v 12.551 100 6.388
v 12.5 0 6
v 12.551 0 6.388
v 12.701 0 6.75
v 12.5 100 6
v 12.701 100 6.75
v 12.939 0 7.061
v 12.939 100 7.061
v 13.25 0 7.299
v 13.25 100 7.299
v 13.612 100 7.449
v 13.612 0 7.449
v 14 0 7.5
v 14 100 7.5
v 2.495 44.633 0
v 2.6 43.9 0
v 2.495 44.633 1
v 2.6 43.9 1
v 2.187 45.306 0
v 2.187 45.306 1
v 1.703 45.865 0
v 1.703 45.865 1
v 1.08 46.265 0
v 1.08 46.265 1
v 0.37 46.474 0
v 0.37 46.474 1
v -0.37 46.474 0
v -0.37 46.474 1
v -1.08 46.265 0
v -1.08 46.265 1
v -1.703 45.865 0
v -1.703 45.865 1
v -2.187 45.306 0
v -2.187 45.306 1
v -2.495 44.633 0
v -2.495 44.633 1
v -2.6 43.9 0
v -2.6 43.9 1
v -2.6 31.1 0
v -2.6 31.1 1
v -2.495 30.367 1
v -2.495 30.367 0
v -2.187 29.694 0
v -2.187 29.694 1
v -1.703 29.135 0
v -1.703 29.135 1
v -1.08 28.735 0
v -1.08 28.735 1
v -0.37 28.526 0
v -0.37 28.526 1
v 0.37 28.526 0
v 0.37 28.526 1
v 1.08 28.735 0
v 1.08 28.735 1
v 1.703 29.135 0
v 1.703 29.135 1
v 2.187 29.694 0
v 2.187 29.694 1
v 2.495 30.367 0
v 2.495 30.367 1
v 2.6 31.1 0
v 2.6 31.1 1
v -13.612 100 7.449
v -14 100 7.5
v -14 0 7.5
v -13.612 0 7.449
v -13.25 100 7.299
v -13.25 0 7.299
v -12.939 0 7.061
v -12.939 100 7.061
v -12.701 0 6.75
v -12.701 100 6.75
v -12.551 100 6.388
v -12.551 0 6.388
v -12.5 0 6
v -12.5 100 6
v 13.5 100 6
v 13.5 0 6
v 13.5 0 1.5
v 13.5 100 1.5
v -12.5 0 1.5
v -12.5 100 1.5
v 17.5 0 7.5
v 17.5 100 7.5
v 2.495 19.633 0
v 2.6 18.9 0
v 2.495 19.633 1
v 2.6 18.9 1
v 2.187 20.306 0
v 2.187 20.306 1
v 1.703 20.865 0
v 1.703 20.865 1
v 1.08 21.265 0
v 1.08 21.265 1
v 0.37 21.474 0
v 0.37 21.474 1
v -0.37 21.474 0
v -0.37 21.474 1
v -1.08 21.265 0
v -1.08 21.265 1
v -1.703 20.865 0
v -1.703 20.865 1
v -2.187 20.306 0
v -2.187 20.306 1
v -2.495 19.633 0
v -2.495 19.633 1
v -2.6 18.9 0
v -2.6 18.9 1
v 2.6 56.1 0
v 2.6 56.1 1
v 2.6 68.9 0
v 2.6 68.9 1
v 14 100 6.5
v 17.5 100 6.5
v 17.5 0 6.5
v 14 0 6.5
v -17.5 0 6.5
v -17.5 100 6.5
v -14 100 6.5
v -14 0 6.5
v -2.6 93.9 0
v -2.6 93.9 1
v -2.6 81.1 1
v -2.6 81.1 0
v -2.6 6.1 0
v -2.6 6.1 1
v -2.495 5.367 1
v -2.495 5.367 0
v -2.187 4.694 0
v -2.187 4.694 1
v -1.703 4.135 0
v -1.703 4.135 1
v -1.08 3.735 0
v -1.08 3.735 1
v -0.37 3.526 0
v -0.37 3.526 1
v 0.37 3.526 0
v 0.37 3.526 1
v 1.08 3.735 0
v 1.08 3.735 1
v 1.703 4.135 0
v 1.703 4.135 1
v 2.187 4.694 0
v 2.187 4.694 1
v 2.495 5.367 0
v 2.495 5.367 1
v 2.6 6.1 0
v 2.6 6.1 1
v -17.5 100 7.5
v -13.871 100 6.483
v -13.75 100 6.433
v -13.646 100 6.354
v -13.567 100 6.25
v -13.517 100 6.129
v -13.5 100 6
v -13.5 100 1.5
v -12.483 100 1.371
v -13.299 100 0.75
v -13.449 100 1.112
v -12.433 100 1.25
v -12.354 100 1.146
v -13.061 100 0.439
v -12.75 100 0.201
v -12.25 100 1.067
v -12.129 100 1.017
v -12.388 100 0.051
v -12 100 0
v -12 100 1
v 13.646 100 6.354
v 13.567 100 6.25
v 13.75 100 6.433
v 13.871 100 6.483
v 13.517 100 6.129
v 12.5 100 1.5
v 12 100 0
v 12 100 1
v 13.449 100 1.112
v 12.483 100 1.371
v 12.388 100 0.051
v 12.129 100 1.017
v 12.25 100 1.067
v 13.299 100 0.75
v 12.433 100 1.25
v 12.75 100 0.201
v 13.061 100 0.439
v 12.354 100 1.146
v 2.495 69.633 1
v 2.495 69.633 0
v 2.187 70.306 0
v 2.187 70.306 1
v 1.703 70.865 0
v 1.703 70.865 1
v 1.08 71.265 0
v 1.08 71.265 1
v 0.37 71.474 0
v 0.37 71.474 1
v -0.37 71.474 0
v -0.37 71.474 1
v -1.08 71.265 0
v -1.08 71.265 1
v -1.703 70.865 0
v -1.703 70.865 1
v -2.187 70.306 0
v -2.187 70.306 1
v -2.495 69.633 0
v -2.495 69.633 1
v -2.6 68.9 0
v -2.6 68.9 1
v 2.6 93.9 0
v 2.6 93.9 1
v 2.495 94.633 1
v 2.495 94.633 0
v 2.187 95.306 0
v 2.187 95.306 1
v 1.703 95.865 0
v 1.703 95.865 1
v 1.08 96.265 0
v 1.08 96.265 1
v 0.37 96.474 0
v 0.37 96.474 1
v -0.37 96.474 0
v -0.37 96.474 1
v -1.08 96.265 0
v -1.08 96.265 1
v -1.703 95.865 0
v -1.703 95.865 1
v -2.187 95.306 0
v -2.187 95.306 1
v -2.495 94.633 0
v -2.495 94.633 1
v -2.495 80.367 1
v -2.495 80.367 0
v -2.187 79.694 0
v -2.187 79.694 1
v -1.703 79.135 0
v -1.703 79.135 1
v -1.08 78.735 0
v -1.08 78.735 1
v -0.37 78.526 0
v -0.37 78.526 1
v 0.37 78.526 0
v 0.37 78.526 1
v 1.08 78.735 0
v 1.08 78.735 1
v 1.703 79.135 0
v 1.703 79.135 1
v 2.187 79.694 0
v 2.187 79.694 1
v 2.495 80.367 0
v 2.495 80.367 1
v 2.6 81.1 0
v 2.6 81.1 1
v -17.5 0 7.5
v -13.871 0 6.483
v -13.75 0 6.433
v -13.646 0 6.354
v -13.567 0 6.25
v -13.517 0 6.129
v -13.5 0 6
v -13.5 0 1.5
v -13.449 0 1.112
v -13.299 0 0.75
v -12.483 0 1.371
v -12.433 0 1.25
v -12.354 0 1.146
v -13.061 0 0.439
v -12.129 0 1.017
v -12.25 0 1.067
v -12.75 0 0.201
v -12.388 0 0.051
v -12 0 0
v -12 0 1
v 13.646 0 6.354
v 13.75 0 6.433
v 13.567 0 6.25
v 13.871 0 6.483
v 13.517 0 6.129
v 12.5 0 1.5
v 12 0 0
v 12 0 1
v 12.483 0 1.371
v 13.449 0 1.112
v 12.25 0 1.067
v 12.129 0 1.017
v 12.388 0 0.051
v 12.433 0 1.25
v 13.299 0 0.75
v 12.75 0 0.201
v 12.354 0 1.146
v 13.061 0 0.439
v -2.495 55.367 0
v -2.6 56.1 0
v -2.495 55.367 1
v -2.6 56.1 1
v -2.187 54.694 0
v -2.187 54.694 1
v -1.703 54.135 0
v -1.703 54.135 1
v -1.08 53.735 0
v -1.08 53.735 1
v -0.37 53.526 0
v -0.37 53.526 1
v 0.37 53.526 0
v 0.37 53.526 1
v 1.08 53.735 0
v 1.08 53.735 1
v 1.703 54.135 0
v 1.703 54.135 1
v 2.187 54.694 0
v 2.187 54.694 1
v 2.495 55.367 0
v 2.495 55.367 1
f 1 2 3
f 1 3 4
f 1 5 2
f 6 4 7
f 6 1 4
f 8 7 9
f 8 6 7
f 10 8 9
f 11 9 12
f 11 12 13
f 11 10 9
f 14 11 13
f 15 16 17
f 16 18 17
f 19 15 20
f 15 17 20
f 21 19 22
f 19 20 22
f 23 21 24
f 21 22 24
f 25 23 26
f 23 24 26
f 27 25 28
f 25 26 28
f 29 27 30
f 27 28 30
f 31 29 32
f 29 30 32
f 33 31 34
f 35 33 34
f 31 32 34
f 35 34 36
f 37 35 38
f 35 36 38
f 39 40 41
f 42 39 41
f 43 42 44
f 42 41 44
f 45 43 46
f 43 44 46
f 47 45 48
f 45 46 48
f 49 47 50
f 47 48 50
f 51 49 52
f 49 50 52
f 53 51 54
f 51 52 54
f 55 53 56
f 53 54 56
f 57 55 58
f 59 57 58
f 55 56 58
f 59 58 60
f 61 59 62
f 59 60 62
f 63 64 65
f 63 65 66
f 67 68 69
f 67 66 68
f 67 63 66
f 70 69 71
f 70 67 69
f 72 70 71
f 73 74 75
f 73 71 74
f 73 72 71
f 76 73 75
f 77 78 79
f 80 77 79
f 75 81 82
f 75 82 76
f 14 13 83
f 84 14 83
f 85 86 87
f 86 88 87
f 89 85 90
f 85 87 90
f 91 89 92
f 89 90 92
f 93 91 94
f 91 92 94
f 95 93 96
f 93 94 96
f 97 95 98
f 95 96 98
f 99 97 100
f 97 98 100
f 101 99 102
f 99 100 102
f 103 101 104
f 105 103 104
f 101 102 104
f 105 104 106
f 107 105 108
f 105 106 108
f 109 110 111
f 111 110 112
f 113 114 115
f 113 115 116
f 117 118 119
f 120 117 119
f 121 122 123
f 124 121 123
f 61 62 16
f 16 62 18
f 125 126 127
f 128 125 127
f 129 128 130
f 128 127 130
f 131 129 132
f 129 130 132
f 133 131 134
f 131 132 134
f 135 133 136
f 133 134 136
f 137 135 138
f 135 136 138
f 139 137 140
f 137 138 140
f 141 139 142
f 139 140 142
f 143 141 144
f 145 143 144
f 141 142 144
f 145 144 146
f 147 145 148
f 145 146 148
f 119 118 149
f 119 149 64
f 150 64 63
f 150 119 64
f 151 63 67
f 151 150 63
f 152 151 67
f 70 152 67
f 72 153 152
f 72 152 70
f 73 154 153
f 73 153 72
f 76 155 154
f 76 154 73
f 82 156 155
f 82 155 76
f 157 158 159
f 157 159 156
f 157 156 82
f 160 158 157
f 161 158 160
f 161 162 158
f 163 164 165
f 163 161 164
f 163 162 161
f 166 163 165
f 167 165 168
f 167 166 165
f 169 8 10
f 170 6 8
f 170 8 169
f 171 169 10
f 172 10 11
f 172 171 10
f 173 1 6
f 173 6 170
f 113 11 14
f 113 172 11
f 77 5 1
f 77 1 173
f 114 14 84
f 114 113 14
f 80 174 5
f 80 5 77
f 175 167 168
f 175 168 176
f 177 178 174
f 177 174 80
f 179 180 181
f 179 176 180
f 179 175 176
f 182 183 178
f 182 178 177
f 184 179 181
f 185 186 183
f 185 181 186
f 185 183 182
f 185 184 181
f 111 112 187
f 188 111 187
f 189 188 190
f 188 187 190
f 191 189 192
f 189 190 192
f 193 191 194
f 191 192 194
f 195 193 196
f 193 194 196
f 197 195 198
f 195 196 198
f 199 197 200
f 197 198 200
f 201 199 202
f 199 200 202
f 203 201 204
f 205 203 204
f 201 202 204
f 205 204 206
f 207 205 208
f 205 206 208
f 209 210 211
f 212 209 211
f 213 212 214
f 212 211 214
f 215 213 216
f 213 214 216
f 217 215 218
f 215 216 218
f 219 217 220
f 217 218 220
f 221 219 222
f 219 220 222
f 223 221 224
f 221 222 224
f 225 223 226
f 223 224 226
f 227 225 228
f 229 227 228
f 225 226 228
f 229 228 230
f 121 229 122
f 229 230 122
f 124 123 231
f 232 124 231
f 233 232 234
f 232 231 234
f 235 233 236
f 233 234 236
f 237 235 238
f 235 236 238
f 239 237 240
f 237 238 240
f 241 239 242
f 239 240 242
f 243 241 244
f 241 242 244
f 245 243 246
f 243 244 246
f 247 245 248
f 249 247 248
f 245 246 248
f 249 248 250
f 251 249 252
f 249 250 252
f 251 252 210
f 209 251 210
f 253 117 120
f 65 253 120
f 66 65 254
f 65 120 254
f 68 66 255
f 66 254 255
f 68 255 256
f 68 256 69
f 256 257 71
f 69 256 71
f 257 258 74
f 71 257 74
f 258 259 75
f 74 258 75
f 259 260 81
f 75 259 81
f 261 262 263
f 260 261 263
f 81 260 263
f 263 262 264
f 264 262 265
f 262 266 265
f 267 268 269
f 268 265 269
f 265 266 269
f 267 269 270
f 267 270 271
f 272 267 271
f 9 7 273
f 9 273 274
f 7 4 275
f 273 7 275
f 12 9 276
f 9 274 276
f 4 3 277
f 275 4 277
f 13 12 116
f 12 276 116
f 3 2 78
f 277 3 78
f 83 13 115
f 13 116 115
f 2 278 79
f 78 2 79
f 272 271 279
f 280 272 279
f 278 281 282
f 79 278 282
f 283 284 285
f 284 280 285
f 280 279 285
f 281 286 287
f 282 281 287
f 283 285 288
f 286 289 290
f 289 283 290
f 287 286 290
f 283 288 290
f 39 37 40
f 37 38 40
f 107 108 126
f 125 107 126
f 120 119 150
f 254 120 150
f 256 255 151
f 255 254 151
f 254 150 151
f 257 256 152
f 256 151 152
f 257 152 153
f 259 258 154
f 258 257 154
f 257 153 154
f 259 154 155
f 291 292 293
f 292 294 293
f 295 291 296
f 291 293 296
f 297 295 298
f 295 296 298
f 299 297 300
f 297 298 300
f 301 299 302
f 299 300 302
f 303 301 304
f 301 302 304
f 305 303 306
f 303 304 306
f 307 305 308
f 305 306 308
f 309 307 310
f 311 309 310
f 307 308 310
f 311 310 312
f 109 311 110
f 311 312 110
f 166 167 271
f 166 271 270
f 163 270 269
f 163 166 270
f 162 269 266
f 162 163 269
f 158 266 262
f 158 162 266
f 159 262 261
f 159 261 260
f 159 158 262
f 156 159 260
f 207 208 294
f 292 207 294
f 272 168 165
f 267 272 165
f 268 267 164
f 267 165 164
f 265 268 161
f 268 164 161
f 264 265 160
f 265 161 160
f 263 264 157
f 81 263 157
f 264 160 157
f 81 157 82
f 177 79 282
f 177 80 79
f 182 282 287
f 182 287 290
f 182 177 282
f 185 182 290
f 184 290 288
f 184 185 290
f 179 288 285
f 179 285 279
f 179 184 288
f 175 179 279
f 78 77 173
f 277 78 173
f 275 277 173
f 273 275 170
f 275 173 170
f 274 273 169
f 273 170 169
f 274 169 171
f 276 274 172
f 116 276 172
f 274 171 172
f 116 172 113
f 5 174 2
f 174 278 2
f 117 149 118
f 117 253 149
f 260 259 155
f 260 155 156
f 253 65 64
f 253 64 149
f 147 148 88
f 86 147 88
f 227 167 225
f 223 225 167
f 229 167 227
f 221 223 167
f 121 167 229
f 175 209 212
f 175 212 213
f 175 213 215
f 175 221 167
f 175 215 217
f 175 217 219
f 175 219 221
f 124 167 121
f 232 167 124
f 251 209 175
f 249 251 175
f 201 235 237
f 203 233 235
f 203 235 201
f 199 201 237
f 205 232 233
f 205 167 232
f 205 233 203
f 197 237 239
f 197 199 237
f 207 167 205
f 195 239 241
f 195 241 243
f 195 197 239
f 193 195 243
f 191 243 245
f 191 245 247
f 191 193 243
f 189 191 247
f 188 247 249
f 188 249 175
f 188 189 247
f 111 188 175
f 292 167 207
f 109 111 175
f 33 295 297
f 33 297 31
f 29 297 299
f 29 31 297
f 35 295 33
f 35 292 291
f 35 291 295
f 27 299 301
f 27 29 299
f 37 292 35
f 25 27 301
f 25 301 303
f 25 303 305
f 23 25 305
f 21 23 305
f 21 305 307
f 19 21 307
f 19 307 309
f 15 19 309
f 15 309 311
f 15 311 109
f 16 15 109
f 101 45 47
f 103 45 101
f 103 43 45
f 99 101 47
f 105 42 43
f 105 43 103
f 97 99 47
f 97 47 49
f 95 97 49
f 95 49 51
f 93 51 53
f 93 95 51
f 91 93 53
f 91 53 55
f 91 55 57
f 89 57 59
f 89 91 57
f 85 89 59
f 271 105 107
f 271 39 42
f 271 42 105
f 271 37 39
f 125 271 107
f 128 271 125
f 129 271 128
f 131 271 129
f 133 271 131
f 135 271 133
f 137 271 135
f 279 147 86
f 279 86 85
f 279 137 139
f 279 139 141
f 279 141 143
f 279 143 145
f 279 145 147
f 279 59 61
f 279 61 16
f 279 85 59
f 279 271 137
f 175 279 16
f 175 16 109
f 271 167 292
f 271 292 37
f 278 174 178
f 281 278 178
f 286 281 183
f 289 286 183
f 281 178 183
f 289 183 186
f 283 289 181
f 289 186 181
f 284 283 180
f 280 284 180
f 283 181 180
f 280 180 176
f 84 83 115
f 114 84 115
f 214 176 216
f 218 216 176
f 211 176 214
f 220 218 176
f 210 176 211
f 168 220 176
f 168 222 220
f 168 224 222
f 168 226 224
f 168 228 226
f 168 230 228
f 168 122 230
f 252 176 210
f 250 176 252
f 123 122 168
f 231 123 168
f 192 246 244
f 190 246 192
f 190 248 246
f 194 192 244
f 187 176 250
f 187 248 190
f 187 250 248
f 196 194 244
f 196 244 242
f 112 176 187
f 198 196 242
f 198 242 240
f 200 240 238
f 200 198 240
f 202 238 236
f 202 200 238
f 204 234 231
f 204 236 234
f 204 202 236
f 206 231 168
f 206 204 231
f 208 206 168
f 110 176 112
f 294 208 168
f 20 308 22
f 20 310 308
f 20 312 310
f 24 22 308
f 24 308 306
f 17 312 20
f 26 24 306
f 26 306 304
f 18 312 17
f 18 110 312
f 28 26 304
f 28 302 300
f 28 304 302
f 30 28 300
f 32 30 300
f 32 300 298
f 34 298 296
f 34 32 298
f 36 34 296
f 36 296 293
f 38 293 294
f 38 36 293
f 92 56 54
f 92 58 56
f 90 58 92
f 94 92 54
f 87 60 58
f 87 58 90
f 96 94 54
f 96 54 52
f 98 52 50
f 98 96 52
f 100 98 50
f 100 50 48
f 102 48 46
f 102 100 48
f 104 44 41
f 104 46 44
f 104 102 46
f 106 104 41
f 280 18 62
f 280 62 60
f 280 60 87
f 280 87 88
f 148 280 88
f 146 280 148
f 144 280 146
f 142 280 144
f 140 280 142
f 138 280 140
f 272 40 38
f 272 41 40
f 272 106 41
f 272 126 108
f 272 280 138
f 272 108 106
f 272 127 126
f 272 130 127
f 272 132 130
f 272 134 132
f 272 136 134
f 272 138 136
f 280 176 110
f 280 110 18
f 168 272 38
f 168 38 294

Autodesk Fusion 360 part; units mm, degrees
sketch "Skizze1" plane through (0, 0, 0) normal (0, 1, 0) x (1, 0, 0)
  line L0 (13.5, -1) -> (-13.5, -1)
  line L1 (-13.5, -1) -> (-13.5, 0)
  line L2 (-13.5, 0) -> (13.5, 0)
  line L3 (13.5, 0) -> (13.5, -1)
  line L4 (13.5, -1) -> (-13.5, 0) construction
  line L5 (-13.5, -1) -> (13.5, 0) construction
  line L6 (-13.5, 0) -> (-12.5, 0)
  line L7 (-12.5, 0) -> (-12.5, -7.5)
  line L8 (-12.5, -7.5) -> (-13.5, -7.5)
  line L9 (-13.5, -7.5) -> (-13.5, 0)
  line L10 (13.5, 0) -> (12.5, 0)
  line L11 (12.5, 0) -> (12.5, -7.5)
  line L12 (12.5, -7.5) -> (13.5, -7.5)
  line L13 (13.5, -7.5) -> (13.5, 0)
  line L14 (-12.5, -7.5) -> (-17.5, -7.5)
  line L15 (-17.5, -7.5) -> (-17.5, -6.5)
  line L16 (-17.5, -6.5) -> (-12.5, -6.5)
  line L17 (-12.5, -6.5) -> (-12.5, -7.5)
  line L18 (12.5, -7.5) -> (17.5, -7.5)
  line L19 (17.5, -7.5) -> (17.5, -6.5)
  line L20 (17.5, -6.5) -> (12.5, -6.5)
  line L21 (12.5, -6.5) -> (12.5, -7.5)
  point P0 (0, -0.5)
  dimension "d7" = 27
  dimension "d8" = 1
  dimension "d9" = 7.5
  dimension "d10" = 1
  dimension "d11" = 7.5
  dimension "d12" = 1
  dimension "d13" = 5
  dimension "d14" = 1
  dimension "d15" = 5
  dimension "d16" = 1
extrude "Extrusion1" add sketch "Skizze1" along normal blind 100
fillet "Abrundung1" radius 1.5 4 edges at (12.5, 50, 7.5) (-12.5, 50, 7.5) (13.5, 50, 0) (-13.5, 50, 0)
fillet "Abrundung2" radius 0.5 4 edges at (-13.5, 50, 6.5) (13.5, 50, 6.5) (12.5, 50, 1) (-12.5, 50, 1)
sketch "Skizze2" plane through (0, 0, 1) normal (0, 0, 1) x (-1, 0, 0)
  line L0 (12, -100) -> (12, 0)
  line L1 (12, 0) -> (-12, 0)
  line L2 (-12, 0) -> (-12, -100)
  line L3 (-12, -100) -> (12, -100)
  line L4 (0, 0) -> (0, -3.5) construction
  line L5 (-2.6, -6.1) -> (-2.6, -18.9)
  arc A0 (-2.6, -18.9) -> (2.6, -18.9) centre (0, -18.9) ccw
  line L6 (2.6, -18.9) -> (2.6, -6.1)
  arc A1 (2.6, -6.1) -> (-2.6, -6.1) centre (0, -6.1) ccw
  line L7 (0, -3.5) -> (0, -21.5) construction
  point P0 (0, -3.5)
  dimension "d26" = 3.5
  dimension "d34" = 18
  dimension "d35" = 5.2
extrude "Extrusion2" cut sketch "Skizze2" against normal blind 1 contours L5 A0 L6 A1
pattern_linear "R-Anordnung1" count 4 spacing 25 along (0, 1, 0) of "Extrusion2"
equation "InnerWidth = 27 mm" comment "BI"
equation "OuterWidth = 37 mm" comment "Equals 35"
equation "Height = 7.5 mm" comment "h"
equation "Thickness = 1 mm" comment "D"
equation "Length = 100 mm" comment "L"
equation "SlotDistance = 25 mm" comment "ALL"
equation "d7 = InnerWidth"
equation "d8 = Thickness"
equation "d9 = Height"
equation "d10 = Thickness"
equation "d11 = Height"
equation "d12 = Thickness"
equation "d13 = ( OuterWidth - InnerWidth ) / 2"
equation "d14 = Thickness"
equation "d15 = ( OuterWidth - InnerWidth ) / 2"
equation "d16 = Thickness"
equation "d17 = Length"
equation "OuterFillet = 1.5 mm" comment "R"
equation "d20 = OuterFillet"
equation "InnerFillet = OuterFillet - Thickness" comment "RK"
equation "d22 = InnerFillet"
equation "SlotWidth = 5.2 mm" comment "LLB"
equation "SlotLength = 18 mm" comment "LLH"
equation "SlotDistance2 = 25 mm" comment "LLA"
equation "d26 = ( ( Length - ( ( Length / SlotDistance2 ) * SlotLength ) ) / ( Length / SlotDistance2 ) ) / 2"
equation "d28 = -Thickness"
equation "d30 = Length / SlotDistance2"
equation "d32 = SlotDistance2"
equation "d34 = SlotLength"
equation "d35 = SlotWidth"
